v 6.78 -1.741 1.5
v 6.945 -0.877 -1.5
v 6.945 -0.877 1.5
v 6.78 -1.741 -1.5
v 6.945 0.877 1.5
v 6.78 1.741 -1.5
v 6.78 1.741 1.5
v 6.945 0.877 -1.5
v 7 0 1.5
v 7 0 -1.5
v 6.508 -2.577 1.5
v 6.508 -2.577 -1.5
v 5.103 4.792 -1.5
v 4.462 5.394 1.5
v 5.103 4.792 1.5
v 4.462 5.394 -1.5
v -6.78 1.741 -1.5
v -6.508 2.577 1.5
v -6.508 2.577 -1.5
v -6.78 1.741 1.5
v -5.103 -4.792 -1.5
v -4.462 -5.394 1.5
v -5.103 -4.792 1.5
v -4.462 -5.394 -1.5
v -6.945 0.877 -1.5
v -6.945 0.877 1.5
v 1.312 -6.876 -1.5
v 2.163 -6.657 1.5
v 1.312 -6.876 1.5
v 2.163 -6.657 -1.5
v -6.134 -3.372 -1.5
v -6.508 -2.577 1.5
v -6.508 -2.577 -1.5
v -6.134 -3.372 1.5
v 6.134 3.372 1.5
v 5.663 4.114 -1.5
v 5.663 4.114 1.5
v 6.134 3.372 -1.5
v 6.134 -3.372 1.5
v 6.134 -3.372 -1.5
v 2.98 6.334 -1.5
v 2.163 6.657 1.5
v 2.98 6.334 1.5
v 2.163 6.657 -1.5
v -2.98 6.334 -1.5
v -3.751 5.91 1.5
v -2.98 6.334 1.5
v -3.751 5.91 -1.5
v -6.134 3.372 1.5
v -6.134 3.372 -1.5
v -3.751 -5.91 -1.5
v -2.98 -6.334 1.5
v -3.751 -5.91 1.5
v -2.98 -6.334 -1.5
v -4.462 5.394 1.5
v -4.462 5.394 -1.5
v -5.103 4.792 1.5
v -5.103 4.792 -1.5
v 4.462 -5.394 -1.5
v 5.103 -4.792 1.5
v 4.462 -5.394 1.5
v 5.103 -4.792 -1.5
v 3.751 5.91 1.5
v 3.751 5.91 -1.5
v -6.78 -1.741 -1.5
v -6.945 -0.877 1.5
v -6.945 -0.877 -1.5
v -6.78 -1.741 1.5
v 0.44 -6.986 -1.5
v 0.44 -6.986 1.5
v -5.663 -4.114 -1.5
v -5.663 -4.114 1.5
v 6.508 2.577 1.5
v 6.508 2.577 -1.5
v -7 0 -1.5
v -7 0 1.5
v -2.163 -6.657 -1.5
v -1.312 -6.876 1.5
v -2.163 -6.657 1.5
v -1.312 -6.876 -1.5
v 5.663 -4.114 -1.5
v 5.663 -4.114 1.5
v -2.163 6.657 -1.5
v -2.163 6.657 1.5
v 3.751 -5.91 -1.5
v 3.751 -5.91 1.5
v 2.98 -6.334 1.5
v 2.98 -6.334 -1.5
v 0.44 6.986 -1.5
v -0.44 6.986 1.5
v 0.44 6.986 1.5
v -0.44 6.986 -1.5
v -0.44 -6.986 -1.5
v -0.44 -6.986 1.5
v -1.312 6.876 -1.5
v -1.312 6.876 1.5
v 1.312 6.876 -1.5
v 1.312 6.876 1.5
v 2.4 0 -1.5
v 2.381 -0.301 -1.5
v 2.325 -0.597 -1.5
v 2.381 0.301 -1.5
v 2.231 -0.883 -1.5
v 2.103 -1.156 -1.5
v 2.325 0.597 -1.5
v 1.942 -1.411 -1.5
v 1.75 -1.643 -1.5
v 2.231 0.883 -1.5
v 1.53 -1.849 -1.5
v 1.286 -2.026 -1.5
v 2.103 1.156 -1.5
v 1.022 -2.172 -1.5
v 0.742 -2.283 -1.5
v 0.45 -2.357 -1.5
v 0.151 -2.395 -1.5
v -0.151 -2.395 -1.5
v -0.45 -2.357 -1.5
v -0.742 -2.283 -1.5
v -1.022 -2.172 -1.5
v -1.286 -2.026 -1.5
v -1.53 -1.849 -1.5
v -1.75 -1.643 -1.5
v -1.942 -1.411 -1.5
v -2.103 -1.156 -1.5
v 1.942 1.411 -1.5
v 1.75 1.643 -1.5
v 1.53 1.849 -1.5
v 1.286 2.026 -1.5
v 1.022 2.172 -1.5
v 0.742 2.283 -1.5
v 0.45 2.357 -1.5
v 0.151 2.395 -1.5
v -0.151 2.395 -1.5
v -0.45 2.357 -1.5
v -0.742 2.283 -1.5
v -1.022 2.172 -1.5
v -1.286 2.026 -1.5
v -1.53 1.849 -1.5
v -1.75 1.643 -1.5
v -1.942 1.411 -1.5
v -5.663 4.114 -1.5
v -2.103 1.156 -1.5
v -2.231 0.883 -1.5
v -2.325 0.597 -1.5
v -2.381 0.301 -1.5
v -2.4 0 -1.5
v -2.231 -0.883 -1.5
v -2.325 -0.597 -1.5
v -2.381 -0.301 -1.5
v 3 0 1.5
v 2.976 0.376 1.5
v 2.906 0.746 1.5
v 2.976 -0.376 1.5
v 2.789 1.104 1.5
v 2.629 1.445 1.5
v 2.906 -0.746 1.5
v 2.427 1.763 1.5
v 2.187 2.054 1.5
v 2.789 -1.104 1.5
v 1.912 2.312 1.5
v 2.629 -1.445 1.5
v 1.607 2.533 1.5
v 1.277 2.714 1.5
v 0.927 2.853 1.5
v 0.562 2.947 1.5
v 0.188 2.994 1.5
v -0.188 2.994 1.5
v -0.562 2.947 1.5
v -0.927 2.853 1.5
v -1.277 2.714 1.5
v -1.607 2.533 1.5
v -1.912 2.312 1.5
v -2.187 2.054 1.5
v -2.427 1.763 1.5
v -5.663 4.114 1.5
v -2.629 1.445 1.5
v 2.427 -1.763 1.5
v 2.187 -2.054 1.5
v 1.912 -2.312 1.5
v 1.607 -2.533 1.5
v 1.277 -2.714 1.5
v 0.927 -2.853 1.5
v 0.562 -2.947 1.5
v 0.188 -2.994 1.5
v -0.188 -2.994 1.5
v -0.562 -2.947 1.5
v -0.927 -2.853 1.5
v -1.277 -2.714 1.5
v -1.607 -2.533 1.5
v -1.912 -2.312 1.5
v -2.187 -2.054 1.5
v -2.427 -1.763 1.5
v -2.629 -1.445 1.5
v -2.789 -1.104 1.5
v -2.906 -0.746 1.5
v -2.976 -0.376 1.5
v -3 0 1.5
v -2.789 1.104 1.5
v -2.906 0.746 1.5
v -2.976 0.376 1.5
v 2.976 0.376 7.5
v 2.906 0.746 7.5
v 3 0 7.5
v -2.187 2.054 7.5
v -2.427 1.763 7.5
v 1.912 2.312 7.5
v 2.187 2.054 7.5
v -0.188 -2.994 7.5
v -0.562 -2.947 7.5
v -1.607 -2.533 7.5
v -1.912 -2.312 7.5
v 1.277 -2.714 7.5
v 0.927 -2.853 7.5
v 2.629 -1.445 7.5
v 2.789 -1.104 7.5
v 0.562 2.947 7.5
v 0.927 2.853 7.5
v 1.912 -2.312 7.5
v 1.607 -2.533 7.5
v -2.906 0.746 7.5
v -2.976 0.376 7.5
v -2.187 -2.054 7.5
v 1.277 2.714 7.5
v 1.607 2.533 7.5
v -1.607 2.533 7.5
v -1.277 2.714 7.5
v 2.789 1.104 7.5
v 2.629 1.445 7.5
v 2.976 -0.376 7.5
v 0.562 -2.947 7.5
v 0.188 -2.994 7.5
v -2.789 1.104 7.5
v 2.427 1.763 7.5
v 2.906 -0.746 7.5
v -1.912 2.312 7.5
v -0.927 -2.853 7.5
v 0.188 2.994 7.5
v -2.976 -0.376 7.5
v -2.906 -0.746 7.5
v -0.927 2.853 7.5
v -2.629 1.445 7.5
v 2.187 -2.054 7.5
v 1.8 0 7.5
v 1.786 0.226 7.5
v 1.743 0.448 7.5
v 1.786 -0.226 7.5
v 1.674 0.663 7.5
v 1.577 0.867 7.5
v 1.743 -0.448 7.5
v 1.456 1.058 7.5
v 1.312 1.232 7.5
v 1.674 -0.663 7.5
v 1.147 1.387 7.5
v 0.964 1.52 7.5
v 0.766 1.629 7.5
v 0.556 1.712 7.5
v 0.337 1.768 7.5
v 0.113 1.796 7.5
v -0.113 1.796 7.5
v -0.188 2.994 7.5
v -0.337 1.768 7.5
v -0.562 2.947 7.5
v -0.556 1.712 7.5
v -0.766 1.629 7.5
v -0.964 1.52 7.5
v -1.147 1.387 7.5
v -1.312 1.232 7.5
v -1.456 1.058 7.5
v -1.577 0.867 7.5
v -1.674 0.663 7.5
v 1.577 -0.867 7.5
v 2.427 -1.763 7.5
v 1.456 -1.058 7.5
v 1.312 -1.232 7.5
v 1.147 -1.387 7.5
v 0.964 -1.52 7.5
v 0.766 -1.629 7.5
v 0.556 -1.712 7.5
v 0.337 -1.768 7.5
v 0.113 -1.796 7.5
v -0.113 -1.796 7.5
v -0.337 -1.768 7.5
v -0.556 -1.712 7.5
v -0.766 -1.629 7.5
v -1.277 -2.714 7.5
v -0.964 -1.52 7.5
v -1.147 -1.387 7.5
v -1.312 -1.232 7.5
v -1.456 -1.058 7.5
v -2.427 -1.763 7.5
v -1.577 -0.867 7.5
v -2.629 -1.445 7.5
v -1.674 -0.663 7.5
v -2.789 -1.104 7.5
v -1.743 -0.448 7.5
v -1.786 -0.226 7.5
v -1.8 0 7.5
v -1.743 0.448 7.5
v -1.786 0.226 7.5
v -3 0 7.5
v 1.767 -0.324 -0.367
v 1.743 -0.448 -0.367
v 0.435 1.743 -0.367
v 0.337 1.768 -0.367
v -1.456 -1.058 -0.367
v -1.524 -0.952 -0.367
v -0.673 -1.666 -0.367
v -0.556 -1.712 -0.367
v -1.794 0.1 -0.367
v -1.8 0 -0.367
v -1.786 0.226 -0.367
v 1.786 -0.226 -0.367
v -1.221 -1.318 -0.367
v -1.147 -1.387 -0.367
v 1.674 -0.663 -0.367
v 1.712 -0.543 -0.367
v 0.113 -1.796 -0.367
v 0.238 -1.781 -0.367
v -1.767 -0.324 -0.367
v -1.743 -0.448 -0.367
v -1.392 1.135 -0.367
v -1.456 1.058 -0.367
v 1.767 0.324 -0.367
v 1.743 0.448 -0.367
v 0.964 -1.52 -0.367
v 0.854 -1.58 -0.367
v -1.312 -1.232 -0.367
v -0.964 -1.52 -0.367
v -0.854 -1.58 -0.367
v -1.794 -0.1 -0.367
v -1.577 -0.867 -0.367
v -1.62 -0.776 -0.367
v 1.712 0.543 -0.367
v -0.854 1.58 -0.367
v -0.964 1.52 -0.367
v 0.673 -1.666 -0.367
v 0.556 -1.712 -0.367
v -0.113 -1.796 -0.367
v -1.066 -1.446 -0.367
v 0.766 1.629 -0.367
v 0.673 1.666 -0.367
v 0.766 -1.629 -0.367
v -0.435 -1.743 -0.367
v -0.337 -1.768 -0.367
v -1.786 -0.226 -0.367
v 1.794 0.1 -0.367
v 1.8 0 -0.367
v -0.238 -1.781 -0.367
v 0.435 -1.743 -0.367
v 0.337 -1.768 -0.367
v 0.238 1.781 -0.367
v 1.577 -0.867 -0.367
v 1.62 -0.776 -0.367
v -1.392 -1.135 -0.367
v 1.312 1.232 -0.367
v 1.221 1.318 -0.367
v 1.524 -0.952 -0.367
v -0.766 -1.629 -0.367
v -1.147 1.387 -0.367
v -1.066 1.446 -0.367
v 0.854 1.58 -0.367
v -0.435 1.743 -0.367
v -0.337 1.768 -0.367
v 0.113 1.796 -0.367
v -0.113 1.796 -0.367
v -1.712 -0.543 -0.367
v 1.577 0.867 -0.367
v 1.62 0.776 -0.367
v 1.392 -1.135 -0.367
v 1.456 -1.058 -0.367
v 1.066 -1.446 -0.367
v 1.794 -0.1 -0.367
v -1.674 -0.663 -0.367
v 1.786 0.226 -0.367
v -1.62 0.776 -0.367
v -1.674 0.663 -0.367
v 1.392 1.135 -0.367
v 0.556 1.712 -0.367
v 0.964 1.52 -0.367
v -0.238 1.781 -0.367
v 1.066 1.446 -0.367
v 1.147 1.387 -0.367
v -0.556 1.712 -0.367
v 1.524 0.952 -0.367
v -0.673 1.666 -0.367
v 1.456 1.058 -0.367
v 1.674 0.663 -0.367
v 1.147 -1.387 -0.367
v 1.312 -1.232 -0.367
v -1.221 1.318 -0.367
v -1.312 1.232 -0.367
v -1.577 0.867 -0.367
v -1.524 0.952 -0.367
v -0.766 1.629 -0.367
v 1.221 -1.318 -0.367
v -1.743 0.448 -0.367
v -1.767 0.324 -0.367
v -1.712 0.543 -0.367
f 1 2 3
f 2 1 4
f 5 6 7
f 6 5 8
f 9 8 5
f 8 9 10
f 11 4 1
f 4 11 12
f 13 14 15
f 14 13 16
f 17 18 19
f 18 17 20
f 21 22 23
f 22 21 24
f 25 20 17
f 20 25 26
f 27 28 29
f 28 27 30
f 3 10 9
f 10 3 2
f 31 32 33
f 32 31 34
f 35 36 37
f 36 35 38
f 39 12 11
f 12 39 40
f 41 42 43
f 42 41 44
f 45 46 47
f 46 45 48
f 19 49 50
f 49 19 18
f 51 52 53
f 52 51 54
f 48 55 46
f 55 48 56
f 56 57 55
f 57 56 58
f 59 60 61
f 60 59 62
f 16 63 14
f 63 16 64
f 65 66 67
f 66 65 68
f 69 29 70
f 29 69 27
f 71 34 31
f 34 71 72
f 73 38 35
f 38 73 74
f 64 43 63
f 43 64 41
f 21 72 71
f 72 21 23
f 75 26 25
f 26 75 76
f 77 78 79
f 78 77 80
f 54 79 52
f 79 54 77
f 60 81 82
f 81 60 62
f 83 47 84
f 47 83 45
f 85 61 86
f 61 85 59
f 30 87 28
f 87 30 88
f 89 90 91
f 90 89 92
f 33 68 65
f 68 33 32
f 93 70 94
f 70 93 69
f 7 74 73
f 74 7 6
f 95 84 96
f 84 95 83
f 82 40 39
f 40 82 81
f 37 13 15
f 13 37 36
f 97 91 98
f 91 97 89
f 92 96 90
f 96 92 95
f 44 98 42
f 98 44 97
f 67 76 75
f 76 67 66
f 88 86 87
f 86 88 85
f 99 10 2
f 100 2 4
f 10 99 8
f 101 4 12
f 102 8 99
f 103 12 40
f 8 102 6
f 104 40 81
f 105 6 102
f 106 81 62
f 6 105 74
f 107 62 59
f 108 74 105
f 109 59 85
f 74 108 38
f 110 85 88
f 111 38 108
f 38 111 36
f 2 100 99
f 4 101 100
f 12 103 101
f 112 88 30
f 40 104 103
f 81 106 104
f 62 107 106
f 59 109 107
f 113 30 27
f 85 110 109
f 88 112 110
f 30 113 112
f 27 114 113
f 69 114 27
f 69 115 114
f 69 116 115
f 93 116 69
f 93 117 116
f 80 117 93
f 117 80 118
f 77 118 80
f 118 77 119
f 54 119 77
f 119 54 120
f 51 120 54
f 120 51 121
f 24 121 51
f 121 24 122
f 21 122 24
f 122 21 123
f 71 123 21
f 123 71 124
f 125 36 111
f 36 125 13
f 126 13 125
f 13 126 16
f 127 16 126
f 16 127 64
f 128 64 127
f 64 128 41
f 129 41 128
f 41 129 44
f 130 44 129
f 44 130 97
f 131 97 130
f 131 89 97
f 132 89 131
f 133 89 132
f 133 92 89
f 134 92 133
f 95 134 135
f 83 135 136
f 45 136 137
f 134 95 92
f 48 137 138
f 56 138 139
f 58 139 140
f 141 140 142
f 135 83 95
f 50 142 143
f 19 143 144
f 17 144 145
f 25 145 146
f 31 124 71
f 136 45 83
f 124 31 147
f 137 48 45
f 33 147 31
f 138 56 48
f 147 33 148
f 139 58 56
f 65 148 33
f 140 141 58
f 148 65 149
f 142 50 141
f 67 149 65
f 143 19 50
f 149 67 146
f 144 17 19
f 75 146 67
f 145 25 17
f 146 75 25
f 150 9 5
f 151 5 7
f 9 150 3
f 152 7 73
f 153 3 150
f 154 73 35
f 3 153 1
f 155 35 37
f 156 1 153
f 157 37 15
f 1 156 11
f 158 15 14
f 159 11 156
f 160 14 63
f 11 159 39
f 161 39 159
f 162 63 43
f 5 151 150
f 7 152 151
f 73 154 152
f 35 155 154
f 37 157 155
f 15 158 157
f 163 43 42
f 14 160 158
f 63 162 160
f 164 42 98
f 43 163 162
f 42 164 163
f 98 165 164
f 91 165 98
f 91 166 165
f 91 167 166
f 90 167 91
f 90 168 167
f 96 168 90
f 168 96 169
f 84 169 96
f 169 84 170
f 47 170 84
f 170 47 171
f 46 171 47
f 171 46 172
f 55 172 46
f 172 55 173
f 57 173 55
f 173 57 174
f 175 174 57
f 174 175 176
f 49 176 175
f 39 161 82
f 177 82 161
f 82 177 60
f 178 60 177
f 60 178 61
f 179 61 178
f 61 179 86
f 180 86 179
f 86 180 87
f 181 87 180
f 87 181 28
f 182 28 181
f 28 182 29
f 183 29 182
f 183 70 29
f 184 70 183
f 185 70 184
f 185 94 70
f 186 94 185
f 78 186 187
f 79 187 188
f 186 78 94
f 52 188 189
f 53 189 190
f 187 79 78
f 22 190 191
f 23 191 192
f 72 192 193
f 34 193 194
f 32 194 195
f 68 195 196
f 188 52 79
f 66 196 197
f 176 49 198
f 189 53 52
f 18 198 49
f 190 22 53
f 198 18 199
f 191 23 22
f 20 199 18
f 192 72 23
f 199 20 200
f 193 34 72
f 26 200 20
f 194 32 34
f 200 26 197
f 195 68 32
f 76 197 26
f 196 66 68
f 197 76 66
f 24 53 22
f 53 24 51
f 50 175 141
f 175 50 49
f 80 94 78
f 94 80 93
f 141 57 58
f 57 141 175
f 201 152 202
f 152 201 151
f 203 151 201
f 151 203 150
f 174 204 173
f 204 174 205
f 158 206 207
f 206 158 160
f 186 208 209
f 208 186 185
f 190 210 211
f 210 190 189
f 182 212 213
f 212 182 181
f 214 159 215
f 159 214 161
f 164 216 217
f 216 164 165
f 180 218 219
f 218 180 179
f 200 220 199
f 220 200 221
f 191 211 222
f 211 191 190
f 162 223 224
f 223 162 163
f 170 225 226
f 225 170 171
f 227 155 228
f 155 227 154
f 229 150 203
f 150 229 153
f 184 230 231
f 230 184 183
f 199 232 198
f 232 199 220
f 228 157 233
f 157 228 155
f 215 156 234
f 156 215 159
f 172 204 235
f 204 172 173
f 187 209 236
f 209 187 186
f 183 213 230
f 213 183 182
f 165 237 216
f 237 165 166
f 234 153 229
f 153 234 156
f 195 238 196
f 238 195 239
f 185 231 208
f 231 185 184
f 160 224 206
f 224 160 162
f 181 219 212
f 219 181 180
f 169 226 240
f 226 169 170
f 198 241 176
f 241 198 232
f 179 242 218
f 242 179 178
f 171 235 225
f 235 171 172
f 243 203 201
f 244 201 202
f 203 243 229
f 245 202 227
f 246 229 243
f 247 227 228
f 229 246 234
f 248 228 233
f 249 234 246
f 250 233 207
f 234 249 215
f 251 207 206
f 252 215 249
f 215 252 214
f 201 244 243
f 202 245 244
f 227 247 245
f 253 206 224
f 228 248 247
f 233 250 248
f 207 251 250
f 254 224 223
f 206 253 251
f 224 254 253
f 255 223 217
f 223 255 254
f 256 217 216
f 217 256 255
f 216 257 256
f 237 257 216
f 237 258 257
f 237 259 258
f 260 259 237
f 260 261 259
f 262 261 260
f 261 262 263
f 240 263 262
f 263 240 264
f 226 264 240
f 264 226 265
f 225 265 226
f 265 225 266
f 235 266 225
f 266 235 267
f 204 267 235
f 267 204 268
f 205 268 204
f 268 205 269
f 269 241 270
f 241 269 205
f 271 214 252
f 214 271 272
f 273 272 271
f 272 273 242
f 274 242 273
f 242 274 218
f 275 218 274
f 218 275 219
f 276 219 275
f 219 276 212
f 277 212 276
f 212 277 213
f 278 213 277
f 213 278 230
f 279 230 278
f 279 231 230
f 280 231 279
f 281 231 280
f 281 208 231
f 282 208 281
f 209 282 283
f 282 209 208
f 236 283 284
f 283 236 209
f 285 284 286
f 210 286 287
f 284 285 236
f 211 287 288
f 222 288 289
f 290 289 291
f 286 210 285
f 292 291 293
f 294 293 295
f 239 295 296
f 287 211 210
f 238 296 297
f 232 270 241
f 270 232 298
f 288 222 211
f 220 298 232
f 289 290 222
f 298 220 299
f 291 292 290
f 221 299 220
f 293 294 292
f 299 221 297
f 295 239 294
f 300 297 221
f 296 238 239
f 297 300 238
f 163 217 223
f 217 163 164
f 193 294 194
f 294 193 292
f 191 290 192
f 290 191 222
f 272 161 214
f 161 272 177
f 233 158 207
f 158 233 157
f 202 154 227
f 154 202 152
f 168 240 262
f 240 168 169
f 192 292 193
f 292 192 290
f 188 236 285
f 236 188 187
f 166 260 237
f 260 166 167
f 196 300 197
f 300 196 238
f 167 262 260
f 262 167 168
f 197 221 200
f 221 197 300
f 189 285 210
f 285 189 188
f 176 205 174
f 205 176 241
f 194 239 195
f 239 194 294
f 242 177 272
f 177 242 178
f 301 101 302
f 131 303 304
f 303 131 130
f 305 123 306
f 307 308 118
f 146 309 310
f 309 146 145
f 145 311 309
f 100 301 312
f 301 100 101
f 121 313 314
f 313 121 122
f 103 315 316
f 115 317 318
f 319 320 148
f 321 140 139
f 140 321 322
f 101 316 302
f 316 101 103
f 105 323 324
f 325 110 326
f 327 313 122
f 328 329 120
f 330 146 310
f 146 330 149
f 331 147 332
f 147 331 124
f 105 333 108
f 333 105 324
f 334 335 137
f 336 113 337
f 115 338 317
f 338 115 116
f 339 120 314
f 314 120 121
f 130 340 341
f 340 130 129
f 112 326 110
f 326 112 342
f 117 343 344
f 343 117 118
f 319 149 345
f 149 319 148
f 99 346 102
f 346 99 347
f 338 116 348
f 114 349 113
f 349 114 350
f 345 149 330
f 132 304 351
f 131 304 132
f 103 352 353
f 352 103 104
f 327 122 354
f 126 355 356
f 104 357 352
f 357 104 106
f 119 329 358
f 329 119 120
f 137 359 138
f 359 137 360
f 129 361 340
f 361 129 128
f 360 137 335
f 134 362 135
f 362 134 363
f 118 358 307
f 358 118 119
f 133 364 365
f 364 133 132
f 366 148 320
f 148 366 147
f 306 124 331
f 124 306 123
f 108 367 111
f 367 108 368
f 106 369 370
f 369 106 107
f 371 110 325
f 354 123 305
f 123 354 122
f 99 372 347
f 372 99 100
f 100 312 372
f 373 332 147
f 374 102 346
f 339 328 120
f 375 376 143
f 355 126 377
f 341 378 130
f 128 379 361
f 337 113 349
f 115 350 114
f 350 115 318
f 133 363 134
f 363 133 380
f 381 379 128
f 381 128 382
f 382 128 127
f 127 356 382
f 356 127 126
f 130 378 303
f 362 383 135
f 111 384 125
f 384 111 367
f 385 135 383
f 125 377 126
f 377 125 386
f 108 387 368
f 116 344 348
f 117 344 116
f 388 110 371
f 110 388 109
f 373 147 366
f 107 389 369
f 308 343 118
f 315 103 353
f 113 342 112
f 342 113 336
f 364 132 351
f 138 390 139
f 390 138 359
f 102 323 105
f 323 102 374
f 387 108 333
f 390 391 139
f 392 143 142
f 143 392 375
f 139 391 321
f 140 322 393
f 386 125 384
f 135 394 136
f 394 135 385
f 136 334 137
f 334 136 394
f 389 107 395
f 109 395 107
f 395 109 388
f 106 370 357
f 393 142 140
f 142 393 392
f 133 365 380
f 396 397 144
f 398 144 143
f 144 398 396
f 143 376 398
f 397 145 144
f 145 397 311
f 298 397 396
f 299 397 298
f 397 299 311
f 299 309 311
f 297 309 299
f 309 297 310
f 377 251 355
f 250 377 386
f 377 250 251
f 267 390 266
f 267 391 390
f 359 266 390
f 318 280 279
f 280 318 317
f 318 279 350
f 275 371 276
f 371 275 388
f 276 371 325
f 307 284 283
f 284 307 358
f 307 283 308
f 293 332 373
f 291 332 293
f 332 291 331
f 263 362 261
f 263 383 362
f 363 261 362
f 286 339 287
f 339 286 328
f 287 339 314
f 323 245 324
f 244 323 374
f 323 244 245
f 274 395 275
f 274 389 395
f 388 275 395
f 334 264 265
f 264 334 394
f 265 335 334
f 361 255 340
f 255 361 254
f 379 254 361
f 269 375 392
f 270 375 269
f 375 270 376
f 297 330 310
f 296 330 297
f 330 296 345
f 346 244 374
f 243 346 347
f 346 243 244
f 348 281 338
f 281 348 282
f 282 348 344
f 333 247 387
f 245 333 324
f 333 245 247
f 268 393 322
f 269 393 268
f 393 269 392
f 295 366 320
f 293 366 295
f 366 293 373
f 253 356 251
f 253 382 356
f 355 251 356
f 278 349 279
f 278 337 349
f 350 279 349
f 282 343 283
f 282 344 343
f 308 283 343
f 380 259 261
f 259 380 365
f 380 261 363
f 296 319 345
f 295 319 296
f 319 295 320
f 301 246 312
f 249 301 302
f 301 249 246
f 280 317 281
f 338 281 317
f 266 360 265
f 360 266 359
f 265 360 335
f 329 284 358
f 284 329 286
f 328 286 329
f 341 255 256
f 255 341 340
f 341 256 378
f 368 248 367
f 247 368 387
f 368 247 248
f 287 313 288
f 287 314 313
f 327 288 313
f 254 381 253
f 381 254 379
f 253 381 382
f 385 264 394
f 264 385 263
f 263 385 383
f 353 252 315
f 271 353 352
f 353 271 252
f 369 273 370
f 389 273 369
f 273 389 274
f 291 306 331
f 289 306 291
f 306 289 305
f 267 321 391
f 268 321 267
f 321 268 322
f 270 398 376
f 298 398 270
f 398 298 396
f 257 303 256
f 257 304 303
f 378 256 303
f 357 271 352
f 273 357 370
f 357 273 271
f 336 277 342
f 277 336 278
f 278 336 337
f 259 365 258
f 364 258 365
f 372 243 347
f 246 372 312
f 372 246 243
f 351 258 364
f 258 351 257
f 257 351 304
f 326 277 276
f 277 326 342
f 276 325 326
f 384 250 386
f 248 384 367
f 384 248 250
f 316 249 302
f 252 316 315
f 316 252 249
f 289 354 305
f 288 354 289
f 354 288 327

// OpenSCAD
$fn = 50;


difference() {
	union() {
		translate(v = [0, 0, -1.5000000000]) {
			cylinder(h = 3, r = 7.0000000000);
		}
		translate(v = [0, 0, -1.5000000000]) {
			cylinder(h = 9, r = 3.0000000000);
		}
	}
	union() {
		translate(v = [0, 0, -1.5000000000]) {
			rotate(a = [0, 180, 0]) {
				difference() {
					union() {
						translate(v = [0, 0, -1.7000000000]) {
							cylinder(h = 1.7000000000, r1 = 1.5000000000, r2 = 2.4000000000);
						}
						translate(v = [0, 0, -9.0000000000]) {
							cylinder(h = 9, r = 1.5000000000);
						}
						translate(v = [0, 0, -9.0000000000]) {
							cylinder(h = 9, r = 1.8000000000);
						}
						translate(v = [0, 0, -9.0000000000]) {
							cylinder(h = 9, r = 1.5000000000);
						}
					}
					union();
				}
			}
		}
		translate(v = [0, 0, -100.0000000000]) {
			cylinder(h = 200, r = 1.5000000000);
		}
	}
}
